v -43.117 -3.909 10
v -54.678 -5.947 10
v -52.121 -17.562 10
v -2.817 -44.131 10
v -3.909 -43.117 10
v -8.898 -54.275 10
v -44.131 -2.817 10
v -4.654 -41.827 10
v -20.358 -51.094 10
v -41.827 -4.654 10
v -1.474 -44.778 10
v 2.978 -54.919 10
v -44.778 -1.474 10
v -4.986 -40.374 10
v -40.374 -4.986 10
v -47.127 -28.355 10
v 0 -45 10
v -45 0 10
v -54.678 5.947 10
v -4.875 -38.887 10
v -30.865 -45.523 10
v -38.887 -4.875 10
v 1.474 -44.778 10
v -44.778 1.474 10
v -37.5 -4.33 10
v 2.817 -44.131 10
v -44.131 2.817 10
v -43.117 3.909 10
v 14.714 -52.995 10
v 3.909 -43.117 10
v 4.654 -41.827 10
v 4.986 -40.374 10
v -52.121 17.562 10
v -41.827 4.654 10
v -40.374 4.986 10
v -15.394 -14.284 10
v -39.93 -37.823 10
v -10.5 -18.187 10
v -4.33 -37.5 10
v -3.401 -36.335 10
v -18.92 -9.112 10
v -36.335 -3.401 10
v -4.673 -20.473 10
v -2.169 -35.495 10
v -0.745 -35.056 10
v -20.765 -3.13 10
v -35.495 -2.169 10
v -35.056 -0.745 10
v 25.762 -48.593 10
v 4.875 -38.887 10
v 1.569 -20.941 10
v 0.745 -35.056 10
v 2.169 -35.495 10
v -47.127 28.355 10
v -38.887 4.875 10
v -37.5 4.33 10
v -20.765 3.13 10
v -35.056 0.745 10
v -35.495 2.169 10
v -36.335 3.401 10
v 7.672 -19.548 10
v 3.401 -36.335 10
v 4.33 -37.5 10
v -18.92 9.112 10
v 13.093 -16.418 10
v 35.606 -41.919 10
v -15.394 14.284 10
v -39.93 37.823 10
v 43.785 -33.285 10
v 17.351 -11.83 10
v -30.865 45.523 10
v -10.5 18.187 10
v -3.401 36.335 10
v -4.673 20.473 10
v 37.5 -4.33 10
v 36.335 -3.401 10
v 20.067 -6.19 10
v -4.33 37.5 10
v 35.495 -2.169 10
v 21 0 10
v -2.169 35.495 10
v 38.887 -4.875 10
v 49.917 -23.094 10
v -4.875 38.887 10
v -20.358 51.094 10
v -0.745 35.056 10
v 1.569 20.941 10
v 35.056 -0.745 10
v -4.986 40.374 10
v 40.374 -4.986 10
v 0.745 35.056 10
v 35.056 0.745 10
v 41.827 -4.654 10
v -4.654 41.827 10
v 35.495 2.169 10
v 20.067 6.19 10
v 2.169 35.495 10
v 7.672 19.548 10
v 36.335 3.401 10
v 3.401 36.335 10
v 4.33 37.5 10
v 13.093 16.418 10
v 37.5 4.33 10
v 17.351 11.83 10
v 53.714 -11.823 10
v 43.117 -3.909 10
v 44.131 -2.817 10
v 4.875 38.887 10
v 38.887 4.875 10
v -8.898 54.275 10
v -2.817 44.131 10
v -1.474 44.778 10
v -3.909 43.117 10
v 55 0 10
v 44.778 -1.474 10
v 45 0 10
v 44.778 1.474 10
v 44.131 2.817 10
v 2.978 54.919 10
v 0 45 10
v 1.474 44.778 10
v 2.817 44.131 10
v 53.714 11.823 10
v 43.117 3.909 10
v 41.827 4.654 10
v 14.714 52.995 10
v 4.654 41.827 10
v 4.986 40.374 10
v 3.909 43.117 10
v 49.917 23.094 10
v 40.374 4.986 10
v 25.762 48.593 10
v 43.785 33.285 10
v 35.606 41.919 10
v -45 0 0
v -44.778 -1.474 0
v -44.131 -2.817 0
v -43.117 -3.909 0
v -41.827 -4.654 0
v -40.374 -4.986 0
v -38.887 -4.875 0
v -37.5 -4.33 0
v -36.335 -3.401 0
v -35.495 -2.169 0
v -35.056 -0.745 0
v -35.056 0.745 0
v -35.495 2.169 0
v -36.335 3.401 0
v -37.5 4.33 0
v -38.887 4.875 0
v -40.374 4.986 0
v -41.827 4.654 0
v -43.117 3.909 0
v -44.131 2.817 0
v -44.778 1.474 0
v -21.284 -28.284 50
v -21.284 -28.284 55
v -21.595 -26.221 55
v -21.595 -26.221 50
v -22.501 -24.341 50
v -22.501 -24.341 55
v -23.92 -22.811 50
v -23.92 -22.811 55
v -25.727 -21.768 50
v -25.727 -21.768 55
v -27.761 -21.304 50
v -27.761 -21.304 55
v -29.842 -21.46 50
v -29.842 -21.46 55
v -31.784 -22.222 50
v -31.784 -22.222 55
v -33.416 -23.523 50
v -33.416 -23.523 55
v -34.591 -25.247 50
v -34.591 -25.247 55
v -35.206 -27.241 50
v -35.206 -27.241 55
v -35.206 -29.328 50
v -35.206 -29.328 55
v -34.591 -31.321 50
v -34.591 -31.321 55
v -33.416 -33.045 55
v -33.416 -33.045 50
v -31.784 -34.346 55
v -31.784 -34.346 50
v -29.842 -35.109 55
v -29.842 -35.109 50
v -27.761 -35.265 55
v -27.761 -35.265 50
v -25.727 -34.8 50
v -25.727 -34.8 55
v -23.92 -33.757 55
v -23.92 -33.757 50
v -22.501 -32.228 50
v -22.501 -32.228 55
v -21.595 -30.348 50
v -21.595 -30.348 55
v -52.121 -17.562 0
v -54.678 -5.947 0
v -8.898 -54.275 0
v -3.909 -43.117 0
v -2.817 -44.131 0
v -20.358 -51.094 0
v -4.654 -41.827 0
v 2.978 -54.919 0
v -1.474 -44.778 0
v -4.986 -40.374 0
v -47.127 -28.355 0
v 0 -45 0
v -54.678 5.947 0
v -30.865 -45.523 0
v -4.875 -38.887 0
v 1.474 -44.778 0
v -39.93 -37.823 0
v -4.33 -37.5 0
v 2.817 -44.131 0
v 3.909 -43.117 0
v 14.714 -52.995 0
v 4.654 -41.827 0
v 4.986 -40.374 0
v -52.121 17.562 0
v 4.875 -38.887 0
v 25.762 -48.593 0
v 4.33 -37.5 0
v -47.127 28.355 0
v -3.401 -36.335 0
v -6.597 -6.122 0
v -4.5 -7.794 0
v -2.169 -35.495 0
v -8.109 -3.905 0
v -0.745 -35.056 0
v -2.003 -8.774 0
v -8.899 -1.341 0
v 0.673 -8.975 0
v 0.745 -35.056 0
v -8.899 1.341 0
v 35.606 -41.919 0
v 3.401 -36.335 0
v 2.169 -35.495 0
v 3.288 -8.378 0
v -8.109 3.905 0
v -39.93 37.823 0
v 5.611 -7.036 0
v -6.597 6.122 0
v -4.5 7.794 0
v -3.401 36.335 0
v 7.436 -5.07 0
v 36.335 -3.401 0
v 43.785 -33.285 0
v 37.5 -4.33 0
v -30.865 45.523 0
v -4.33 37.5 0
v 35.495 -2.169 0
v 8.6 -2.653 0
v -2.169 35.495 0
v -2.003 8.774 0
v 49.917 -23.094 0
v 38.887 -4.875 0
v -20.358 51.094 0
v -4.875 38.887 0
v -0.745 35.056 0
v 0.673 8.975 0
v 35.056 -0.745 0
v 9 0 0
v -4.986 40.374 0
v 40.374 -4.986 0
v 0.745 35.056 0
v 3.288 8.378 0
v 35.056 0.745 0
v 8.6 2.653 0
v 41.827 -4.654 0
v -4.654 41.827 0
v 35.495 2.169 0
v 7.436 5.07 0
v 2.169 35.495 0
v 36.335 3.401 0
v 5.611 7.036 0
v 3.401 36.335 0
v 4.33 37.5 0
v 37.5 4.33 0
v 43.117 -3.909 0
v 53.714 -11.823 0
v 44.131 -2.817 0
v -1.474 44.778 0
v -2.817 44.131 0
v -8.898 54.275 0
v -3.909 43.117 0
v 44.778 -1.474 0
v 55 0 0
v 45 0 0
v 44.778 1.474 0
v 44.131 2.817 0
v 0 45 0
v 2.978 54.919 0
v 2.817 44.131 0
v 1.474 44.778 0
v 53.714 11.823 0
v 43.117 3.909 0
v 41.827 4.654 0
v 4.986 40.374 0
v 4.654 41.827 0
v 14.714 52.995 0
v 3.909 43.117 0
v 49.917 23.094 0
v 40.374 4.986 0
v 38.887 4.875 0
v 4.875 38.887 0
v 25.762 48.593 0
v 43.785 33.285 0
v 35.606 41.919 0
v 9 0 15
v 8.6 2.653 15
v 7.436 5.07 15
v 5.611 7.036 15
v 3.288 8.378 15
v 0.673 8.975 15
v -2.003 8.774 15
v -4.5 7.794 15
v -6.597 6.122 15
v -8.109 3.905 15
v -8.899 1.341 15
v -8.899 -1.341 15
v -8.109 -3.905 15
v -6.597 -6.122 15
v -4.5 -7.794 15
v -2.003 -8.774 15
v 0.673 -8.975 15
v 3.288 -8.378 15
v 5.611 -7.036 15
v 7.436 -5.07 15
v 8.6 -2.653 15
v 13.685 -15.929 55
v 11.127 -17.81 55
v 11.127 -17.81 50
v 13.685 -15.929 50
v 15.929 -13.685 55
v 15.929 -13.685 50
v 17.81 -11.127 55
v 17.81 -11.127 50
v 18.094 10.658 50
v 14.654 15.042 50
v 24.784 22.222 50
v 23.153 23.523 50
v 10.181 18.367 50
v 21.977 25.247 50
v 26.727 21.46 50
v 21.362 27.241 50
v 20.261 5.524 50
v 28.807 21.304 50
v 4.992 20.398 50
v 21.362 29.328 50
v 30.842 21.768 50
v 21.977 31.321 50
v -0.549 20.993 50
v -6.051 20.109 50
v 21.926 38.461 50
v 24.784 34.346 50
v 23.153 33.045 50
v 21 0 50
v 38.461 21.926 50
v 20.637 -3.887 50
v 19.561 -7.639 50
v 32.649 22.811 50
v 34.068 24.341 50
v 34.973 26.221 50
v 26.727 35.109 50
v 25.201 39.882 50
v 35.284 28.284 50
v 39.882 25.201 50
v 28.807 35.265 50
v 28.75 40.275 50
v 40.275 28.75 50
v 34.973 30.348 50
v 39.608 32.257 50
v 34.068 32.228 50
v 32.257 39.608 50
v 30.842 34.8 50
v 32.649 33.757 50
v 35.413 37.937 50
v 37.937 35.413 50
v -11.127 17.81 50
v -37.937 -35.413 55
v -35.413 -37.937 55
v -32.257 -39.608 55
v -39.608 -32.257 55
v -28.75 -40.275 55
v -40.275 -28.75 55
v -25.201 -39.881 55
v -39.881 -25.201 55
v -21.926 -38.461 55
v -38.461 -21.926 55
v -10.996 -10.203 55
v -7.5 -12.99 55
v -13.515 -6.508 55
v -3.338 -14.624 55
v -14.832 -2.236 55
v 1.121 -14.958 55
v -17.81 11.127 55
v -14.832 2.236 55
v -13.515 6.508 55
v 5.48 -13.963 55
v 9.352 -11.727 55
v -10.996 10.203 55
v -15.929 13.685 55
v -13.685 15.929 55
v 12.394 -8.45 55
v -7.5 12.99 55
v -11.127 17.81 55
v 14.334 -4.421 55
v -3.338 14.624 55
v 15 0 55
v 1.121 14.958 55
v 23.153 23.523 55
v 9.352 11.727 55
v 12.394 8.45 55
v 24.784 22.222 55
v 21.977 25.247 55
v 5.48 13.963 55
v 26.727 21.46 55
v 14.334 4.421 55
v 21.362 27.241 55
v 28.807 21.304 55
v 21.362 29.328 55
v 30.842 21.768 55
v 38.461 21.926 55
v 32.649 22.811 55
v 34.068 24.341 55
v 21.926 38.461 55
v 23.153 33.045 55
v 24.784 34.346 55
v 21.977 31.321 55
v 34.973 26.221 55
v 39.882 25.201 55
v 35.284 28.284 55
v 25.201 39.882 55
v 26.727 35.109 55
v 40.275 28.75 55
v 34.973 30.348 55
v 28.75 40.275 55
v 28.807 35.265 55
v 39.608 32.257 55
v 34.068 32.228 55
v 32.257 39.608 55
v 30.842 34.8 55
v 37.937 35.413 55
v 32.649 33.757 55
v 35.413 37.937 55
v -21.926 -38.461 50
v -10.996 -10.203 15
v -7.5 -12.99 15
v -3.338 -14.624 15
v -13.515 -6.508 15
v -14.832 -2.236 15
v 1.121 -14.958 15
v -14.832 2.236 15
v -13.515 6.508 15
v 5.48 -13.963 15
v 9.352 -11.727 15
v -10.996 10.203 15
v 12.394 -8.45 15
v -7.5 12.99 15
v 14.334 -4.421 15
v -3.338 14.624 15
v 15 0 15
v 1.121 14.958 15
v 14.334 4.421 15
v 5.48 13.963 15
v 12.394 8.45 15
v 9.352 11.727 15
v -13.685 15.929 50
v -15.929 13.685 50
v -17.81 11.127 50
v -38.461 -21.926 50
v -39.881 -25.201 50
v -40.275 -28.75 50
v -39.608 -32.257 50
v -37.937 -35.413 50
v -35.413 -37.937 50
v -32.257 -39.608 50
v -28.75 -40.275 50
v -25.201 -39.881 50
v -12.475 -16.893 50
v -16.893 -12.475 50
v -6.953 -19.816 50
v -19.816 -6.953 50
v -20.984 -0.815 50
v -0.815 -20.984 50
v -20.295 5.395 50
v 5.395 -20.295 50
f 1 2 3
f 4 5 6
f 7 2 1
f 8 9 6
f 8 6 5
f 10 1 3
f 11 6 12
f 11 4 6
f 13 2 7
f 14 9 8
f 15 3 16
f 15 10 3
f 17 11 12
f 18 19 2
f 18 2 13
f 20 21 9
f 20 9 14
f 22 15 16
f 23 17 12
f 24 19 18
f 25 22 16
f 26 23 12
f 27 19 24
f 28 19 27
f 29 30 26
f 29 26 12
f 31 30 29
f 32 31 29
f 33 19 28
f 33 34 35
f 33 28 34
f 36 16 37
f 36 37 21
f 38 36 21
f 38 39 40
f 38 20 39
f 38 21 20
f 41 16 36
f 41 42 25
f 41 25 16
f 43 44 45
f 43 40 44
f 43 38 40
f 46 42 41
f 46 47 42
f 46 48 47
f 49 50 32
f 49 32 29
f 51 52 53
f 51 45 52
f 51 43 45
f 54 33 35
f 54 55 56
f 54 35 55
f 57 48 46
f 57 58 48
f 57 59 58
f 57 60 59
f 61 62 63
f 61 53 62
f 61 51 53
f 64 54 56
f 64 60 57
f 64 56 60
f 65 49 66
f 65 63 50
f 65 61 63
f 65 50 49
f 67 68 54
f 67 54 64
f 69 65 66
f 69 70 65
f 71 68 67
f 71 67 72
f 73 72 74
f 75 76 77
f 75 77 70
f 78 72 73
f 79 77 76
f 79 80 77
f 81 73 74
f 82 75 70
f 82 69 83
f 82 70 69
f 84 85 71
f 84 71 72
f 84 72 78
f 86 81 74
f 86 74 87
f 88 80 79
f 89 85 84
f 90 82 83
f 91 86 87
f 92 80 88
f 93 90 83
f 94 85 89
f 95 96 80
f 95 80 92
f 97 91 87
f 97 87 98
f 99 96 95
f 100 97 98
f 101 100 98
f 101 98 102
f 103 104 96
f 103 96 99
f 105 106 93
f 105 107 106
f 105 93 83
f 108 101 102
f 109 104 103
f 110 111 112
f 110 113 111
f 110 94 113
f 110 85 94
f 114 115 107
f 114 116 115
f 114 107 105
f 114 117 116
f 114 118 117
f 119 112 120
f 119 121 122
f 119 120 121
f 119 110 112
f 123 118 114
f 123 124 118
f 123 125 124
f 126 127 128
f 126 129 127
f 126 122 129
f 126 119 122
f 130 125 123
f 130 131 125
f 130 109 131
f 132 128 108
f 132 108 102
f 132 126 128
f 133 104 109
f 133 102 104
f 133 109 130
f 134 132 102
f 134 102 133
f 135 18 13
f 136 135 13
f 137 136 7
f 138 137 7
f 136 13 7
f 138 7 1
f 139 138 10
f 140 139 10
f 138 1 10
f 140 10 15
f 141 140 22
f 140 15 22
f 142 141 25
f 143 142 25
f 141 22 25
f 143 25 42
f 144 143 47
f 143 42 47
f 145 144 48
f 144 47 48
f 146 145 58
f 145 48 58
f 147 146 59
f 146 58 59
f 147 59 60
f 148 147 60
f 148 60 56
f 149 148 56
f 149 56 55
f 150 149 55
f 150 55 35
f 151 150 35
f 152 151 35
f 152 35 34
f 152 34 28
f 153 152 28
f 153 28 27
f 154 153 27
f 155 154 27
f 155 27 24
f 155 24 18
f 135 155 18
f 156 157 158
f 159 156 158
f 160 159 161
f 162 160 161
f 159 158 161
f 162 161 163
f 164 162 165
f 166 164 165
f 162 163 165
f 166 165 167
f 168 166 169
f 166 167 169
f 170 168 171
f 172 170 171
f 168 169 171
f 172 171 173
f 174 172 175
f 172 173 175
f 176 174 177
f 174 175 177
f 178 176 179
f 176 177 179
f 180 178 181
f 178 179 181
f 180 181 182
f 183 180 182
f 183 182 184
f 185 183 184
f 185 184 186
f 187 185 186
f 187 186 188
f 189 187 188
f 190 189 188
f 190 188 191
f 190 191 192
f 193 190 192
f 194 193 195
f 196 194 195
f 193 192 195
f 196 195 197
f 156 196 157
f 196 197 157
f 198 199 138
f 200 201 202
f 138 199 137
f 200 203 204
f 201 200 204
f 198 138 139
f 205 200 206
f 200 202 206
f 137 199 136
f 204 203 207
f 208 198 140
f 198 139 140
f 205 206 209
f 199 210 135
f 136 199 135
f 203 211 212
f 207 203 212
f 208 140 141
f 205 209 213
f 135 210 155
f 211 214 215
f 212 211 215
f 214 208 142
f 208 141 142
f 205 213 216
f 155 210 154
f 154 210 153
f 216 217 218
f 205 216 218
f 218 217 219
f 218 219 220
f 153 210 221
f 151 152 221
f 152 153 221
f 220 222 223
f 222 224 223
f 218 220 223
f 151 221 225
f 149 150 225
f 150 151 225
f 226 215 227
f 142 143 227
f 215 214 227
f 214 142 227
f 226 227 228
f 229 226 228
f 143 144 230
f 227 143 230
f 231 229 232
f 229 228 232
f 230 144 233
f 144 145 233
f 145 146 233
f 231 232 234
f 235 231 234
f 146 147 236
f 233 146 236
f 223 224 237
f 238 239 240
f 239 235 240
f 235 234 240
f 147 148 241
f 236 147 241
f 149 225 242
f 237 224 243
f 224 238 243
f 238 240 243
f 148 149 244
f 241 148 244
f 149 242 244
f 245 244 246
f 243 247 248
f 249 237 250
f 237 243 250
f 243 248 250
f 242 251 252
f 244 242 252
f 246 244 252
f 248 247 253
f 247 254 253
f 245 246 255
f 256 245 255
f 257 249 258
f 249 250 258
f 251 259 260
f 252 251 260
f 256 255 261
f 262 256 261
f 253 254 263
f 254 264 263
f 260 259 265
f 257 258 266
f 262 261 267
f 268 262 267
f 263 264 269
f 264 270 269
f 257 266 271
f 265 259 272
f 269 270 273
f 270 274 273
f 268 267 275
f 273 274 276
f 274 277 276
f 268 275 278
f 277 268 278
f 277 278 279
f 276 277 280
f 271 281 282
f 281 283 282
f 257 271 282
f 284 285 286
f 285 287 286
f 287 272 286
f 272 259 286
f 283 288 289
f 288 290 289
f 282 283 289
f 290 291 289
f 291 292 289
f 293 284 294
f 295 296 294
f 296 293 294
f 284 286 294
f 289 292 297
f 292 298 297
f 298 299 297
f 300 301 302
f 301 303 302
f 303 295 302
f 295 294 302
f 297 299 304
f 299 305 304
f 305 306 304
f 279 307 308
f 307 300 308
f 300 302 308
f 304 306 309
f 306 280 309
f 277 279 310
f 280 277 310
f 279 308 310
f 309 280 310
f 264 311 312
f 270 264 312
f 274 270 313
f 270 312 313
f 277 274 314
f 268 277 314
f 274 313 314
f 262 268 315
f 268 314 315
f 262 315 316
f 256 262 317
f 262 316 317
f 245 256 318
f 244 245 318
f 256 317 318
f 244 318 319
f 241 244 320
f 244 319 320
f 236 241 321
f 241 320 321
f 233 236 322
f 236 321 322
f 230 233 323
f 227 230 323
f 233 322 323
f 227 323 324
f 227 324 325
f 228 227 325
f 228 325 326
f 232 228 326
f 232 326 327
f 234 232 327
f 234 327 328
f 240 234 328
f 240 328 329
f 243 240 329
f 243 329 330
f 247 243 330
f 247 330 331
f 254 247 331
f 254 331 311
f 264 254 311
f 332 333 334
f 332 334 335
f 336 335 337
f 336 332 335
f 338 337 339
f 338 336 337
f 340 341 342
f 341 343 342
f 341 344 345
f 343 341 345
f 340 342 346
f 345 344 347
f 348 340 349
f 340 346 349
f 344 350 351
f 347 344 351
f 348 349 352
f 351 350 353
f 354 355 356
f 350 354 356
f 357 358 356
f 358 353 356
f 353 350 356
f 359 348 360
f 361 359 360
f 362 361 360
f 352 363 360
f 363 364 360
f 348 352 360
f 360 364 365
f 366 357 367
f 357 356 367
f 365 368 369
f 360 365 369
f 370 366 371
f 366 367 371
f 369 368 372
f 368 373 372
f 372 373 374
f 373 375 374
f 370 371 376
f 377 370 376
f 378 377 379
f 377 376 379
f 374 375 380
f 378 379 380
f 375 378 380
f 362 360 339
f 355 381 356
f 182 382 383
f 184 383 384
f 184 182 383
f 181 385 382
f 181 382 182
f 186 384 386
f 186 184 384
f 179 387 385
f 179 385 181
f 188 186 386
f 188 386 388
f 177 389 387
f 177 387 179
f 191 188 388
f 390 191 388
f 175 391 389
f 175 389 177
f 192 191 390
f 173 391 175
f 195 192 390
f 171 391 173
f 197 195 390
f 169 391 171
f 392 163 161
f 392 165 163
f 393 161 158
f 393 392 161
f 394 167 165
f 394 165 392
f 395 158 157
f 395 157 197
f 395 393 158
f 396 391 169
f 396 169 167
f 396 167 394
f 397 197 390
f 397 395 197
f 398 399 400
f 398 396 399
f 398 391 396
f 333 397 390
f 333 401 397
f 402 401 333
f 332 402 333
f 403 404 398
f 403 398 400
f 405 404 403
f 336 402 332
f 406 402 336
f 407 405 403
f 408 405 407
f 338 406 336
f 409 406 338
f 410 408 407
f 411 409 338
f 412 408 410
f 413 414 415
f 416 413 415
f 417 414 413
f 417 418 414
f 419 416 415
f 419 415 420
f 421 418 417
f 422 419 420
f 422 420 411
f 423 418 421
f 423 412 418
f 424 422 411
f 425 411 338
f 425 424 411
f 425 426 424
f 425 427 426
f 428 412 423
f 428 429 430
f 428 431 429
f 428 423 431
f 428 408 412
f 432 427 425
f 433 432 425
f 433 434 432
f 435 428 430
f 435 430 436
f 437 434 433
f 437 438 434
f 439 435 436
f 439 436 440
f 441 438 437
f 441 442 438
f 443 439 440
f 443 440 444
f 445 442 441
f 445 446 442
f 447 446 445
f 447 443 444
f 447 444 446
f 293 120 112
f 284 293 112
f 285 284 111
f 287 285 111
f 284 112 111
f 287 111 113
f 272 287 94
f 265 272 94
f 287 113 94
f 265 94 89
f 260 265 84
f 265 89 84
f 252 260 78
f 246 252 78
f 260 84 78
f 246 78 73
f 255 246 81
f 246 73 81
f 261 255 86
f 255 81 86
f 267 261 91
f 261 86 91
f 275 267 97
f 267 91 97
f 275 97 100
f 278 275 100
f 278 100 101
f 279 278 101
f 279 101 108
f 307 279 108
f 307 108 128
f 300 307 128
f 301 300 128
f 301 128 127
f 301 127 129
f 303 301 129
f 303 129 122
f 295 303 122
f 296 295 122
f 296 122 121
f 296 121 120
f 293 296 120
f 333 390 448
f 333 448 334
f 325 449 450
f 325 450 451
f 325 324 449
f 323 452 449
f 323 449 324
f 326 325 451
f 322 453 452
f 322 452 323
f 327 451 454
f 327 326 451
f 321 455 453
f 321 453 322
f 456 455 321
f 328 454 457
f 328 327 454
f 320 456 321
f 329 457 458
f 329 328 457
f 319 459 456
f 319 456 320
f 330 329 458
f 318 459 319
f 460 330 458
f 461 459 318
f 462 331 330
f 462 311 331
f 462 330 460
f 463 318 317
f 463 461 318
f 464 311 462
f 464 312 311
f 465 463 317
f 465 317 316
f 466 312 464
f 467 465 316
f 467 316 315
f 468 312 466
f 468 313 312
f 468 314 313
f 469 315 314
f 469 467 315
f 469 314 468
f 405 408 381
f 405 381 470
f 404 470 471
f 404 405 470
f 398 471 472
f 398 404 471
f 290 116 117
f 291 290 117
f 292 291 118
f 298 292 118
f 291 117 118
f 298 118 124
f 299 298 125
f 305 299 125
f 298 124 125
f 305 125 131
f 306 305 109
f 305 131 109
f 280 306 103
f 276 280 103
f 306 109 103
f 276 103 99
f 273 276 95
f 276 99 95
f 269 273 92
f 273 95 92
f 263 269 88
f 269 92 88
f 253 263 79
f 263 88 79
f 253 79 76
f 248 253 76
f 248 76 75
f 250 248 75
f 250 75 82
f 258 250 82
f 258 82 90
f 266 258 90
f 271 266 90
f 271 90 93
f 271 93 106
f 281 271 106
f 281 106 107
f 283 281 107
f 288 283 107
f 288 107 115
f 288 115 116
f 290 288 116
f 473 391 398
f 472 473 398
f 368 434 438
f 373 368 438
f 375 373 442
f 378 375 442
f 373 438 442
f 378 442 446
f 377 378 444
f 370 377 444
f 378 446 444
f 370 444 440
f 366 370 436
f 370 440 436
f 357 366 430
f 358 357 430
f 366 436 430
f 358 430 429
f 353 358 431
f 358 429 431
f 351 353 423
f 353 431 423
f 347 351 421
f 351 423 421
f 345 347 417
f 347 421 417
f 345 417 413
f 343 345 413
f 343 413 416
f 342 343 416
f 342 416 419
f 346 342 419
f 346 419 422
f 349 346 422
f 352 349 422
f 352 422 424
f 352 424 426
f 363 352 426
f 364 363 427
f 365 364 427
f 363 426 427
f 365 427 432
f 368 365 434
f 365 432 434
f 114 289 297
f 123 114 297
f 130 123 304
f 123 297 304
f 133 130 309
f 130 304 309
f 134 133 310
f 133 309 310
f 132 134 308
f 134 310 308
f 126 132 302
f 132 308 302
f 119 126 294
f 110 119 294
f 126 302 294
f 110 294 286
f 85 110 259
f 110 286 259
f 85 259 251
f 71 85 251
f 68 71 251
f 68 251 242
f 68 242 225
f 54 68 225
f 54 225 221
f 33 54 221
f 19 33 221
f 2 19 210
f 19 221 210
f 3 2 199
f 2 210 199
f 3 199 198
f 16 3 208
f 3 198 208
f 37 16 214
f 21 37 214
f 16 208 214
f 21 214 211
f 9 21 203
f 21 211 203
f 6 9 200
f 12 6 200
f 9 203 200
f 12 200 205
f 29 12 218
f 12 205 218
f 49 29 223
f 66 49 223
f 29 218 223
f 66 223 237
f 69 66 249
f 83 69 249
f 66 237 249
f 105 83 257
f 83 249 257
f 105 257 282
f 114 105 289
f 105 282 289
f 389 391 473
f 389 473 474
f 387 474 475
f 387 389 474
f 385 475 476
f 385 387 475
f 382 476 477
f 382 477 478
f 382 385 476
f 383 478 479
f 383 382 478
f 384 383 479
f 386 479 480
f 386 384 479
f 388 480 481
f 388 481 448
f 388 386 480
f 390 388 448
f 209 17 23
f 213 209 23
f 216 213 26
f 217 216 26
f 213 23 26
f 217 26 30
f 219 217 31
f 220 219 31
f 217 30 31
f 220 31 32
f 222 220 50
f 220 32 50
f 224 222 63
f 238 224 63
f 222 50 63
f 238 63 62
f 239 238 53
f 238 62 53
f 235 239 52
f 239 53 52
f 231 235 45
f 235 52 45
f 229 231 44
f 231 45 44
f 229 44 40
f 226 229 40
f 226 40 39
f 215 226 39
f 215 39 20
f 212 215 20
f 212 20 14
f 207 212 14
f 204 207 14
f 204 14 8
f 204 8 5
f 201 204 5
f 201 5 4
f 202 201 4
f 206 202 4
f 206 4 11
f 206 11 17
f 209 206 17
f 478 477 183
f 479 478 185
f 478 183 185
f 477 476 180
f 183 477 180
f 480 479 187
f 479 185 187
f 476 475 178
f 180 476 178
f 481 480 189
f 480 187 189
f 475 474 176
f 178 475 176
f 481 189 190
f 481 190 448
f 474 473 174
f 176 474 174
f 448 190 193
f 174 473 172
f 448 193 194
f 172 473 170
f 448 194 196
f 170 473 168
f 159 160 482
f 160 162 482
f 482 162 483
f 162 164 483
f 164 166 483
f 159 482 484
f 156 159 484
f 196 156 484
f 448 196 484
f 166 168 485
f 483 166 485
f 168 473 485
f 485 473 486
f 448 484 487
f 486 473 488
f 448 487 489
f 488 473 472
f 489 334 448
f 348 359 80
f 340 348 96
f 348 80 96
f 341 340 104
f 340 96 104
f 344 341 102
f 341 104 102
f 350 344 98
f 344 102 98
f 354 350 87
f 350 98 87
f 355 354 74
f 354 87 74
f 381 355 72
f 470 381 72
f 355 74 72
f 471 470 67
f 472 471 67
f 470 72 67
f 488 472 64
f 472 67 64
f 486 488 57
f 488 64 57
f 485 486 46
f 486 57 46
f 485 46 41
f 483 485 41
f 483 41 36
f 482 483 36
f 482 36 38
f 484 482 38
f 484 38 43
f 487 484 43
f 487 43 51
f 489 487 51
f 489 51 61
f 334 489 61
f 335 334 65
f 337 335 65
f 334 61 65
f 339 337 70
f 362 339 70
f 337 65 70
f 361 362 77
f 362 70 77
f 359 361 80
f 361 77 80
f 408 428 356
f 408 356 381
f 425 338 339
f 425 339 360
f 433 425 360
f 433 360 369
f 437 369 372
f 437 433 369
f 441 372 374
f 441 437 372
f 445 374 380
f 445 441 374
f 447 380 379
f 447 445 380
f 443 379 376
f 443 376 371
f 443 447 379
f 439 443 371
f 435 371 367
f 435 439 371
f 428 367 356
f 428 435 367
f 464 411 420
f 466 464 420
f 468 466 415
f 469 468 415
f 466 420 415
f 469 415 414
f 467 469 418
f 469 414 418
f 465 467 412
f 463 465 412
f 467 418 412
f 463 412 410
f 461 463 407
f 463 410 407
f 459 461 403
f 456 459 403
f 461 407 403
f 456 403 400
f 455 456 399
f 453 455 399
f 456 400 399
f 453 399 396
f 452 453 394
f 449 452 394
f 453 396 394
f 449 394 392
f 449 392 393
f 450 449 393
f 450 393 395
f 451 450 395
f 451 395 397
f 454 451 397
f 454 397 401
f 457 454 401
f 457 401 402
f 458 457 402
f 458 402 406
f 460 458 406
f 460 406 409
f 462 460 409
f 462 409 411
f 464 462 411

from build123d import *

# Parameters (mm, degrees)
SKETCH_R           = 55
SKETCH_R_2         = 9
PAD_DEPTH          = 10
SKETCH001_R        = 5
POCKET_DEPTH       = 321.770145
POLARPATTERN_COUNT = 4
SKETCH002_R        = 21
PAD001_DEPTH       = 45
SKETCH003_R        = 15
POCKET001_DEPTH    = 40
SKETCH004_R        = 9
POCKET002_DEPTH    = 5
SKETCH005_R        = 7
SKETCH005_R_2      = 15
PAD002_DEPTH       = 5


with BuildPart() as part:
    # Sketch → Pad (new body)
    with BuildSketch(Plane.XY):
        Circle(SKETCH_R)
        Circle(SKETCH_R_2, mode=Mode.SUBTRACT)
    extrude(amount=PAD_DEPTH)

    # Sketch001 → Pocket (cut, through all)
    with BuildSketch(Plane.XY.offset(10)):
        with Locations((40, 0)):
            Circle(SKETCH001_R)
    pocket = extrude(amount=-POCKET_DEPTH, mode=Mode.SUBTRACT)

    # PolarPattern: Pocket ×4 about axis
    polarpattern_axis = Axis((0, 0, 10), (0, 0, 1))
    for i in range(1, POLARPATTERN_COUNT):
        add(pocket.rotate(polarpattern_axis, i * 360 / POLARPATTERN_COUNT), mode=Mode.SUBTRACT)

    # Sketch002 → Pad001 (new body)
    with BuildSketch(Plane.XY.offset(10)):
        Circle(SKETCH002_R)
    extrude(amount=PAD001_DEPTH)

    # Sketch003 → Pocket001 (cut)
    with BuildSketch(Plane.XY.offset(55)):
        Circle(SKETCH003_R)
    extrude(amount=-POCKET001_DEPTH, mode=Mode.SUBTRACT)

    # Sketch004 → Pocket002 (cut)
    with BuildSketch(Plane.XY.offset(15)):
        Circle(SKETCH004_R)
    extrude(amount=-POCKET002_DEPTH, mode=Mode.SUBTRACT)

    # Sketch005 → Pad002 (new body)
    with BuildSketch(Plane.XY.offset(55)):
        with BuildLine():
            ThreePointArc((-38.461152, -21.925726), (-36.769553, -36.769553), (-21.925726, -38.461152))
            Line((-21.925726, -38.461152), (11.127411, -17.809568))
            ThreePointArc((11.127411, -17.809568), (14.849242, -14.849243), (17.809568, -11.127412))
            Line((17.809568, -11.127412), (38.461174, 21.925761))
            ThreePointArc((38.461174, 21.925761), (36.769553, 36.769553), (21.925761, 38.461174))
            Line((21.925761, 38.461174), (-11.127412, 17.809568))
            ThreePointArc((-11.127412, 17.809568), (-14.849243, 14.849242), (-17.809568, 11.127411))
            Line((-38.461152, -21.925726), (-17.809568, 11.127411))
        make_face()
        with Locations((-28.284271, -28.284271)):
            Circle(SKETCH005_R, mode=Mode.SUBTRACT)
        with Locations((28.284271, 28.284271)):
            Circle(SKETCH005_R, mode=Mode.SUBTRACT)
        Circle(SKETCH005_R_2, mode=Mode.SUBTRACT)
    extrude(amount=-PAD002_DEPTH)


solid = part.part
